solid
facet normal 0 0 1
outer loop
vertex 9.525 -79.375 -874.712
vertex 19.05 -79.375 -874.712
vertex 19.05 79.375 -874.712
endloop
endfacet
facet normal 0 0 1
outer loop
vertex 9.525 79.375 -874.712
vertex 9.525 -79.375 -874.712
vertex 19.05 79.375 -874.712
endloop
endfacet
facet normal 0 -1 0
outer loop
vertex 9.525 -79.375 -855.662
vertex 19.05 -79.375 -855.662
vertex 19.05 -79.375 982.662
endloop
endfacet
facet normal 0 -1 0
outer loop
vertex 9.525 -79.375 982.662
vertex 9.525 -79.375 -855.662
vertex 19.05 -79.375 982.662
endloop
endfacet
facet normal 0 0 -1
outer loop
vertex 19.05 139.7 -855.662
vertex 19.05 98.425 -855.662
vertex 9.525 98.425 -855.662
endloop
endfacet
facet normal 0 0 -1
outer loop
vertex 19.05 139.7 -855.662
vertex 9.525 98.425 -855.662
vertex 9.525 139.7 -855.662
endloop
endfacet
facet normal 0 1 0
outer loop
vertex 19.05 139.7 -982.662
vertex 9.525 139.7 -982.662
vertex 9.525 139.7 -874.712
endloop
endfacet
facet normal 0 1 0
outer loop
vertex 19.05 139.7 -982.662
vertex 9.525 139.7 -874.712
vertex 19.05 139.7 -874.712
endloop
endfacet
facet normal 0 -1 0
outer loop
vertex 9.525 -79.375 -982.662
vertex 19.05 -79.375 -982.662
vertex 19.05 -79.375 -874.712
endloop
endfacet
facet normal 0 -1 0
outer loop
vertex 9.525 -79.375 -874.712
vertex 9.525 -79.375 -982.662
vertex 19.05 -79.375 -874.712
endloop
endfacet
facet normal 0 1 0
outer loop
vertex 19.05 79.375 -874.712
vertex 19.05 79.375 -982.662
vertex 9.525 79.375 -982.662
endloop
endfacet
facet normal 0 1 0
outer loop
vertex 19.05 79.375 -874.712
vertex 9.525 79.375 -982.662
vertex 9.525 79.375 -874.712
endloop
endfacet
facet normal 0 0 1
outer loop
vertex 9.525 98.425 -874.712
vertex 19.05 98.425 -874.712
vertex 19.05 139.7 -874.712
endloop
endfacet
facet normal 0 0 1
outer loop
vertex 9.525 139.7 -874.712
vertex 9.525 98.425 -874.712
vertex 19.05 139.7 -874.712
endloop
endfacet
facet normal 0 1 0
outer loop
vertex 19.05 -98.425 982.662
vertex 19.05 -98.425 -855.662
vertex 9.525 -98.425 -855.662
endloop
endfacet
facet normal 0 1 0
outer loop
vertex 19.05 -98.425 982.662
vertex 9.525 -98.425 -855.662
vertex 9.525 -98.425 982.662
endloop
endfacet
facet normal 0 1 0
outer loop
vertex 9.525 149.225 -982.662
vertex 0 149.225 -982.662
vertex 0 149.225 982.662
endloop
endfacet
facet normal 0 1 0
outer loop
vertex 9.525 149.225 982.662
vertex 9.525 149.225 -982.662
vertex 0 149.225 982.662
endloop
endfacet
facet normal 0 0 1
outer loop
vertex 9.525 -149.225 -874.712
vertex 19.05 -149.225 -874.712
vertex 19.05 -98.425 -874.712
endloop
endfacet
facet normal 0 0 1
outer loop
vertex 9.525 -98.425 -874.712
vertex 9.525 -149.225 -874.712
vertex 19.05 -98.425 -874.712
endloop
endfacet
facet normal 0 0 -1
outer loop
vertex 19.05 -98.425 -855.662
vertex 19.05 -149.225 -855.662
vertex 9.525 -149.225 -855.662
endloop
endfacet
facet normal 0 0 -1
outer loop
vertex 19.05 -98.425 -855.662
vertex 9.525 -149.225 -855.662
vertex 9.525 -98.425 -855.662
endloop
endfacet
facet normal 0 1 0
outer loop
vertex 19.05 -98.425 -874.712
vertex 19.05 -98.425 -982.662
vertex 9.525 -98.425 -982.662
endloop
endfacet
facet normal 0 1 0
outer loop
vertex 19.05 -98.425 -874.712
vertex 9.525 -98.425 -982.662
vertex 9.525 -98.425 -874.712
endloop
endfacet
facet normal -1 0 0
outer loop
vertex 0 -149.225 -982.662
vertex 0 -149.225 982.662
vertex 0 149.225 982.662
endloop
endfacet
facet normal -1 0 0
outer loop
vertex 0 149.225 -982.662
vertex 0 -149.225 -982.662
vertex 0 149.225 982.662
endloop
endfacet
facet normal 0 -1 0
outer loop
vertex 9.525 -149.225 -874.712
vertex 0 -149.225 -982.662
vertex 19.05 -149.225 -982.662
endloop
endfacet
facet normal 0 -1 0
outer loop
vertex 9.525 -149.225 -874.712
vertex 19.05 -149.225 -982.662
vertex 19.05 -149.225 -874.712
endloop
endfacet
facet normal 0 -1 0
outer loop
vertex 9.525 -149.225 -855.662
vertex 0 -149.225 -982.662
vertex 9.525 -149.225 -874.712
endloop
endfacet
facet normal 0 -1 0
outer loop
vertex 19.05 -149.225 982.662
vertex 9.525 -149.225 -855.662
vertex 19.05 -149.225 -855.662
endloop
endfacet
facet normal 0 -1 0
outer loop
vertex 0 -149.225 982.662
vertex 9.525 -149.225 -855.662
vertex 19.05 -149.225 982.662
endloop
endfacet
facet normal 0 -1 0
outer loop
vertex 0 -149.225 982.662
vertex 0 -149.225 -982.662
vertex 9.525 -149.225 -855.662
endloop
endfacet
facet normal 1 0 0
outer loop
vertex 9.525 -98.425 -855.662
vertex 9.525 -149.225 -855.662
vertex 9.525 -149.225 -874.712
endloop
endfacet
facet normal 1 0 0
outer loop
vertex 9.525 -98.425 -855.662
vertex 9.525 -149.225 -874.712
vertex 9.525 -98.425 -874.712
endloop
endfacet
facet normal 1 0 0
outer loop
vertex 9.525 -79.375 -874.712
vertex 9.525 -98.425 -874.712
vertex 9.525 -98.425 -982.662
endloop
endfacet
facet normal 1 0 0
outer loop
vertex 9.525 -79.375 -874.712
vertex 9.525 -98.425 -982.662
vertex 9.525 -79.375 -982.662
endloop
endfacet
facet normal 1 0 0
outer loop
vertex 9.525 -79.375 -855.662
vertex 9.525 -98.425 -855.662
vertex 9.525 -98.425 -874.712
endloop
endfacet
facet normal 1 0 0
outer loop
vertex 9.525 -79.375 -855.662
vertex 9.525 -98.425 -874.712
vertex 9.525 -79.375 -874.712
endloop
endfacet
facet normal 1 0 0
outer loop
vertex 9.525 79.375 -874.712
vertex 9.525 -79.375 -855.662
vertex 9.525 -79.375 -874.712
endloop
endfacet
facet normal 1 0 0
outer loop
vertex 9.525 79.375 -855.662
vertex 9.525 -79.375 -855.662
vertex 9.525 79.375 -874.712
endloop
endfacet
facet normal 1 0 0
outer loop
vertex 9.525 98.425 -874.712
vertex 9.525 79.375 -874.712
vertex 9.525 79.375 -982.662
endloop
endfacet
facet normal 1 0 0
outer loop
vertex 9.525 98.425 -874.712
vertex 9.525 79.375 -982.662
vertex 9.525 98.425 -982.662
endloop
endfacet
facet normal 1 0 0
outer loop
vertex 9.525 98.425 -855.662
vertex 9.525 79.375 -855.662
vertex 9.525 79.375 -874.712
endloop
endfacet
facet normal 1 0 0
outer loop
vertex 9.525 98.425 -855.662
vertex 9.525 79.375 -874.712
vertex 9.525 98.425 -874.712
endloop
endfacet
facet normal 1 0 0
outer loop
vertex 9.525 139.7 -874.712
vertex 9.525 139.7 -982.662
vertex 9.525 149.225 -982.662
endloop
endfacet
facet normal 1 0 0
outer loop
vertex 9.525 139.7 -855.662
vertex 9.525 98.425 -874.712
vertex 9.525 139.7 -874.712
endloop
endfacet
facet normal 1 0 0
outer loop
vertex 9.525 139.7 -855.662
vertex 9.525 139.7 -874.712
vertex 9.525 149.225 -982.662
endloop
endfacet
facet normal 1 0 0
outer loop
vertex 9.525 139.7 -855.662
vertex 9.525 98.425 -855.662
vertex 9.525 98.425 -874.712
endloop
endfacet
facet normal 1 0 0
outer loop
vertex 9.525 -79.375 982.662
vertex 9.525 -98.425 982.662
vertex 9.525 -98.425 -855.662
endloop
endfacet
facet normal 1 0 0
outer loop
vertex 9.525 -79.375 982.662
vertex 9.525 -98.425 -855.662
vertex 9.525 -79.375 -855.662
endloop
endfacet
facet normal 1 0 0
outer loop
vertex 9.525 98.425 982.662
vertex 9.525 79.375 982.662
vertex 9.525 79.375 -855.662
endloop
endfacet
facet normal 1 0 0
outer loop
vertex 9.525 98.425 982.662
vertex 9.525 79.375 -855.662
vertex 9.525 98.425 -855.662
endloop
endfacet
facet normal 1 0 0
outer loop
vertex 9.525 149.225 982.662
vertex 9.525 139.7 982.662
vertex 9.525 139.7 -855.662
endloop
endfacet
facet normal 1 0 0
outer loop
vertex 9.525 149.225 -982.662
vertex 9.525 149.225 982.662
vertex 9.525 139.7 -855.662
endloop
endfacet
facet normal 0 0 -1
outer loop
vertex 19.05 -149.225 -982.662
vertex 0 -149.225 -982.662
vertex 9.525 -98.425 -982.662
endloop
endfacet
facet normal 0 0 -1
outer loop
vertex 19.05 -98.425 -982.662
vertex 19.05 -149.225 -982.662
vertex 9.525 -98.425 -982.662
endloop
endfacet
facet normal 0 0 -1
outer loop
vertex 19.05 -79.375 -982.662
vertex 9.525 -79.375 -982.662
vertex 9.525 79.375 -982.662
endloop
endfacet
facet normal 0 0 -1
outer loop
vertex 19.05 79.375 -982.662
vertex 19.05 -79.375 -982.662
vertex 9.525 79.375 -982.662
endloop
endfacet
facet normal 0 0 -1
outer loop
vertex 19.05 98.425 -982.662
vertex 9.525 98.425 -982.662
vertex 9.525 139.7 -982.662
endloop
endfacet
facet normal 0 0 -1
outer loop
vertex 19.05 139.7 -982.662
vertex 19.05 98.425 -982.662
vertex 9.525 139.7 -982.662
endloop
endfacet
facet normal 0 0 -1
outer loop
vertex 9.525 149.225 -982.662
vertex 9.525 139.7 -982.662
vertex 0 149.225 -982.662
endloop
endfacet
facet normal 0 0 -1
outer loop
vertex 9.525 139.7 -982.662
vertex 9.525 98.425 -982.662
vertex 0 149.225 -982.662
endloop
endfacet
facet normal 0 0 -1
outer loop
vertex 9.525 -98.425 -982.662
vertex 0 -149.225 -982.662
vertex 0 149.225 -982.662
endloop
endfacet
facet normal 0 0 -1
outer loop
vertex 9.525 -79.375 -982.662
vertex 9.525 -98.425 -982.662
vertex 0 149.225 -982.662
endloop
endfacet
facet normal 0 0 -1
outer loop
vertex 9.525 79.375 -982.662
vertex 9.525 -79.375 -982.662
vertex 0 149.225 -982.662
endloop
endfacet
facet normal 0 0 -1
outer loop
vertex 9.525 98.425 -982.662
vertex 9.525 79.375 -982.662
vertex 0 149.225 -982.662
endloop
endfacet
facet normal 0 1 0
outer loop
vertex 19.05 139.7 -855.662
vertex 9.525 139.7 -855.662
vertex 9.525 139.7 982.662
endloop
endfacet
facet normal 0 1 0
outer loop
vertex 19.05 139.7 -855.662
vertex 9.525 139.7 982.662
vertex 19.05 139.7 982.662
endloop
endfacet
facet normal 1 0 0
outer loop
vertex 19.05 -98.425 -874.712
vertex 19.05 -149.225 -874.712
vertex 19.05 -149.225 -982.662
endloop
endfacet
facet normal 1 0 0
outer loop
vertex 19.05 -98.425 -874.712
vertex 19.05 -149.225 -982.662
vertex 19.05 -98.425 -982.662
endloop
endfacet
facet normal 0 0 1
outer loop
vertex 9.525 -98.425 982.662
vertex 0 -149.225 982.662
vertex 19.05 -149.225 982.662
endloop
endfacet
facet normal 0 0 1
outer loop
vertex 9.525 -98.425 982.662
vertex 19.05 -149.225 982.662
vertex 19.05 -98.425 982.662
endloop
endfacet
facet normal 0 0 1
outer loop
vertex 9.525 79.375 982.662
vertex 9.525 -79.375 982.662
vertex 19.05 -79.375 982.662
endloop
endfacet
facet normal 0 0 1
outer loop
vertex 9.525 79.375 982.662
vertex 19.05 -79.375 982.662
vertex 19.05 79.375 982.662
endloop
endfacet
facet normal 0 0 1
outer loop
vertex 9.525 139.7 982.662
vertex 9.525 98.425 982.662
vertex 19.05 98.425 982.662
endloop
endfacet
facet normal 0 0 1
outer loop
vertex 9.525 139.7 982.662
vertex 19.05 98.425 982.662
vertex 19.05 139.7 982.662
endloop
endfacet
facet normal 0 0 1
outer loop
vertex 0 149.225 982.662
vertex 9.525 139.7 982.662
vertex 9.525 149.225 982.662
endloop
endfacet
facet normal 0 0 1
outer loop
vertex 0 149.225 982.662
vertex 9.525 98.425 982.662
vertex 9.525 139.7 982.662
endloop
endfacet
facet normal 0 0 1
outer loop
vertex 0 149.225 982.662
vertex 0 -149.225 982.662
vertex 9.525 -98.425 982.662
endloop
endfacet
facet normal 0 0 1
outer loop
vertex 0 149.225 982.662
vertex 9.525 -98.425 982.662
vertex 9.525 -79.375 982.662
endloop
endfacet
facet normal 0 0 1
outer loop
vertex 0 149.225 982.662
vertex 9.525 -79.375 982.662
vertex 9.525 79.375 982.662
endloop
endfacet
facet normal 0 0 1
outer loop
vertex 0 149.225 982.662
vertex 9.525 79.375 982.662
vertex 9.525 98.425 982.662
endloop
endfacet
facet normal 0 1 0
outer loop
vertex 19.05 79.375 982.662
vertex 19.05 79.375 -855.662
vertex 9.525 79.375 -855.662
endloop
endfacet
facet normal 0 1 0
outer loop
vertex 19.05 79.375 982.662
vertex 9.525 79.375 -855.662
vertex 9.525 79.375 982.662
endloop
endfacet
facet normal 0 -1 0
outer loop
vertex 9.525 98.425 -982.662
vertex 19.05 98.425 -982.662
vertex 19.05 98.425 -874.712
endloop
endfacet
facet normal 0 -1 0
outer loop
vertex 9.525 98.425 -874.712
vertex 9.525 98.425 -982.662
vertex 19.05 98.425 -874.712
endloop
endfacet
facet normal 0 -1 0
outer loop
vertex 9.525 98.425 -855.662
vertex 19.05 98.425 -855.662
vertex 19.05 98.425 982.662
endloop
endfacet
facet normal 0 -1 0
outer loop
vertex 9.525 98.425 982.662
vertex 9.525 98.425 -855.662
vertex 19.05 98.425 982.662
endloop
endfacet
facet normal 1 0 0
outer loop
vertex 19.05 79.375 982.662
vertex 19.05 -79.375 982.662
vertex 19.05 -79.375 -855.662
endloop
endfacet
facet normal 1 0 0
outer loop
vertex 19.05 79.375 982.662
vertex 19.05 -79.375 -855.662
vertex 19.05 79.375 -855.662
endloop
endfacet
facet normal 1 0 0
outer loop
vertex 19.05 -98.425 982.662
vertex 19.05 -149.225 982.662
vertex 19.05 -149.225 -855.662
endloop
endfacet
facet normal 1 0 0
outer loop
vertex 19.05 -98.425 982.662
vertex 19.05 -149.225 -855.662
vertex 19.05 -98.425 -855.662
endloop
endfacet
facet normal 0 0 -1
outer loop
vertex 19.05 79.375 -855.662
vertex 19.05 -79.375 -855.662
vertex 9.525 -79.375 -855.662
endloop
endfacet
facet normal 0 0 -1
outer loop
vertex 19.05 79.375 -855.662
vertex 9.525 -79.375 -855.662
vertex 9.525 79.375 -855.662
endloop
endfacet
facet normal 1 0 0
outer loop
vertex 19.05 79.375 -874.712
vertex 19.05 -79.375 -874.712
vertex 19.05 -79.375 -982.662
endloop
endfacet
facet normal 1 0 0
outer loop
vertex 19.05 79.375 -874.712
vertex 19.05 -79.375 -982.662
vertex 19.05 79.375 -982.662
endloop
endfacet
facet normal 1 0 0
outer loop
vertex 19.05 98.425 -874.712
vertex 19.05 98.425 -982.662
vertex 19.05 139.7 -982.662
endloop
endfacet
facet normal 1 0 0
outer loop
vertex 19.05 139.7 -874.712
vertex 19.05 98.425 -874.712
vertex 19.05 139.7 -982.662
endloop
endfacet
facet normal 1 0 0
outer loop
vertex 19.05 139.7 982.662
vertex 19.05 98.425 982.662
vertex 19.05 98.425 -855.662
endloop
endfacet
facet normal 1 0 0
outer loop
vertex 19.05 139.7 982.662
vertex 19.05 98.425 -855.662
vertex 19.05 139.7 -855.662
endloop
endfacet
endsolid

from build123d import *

# Parameters (mm, degrees)
F0_W     = 298.45
F0_H     = 1965.325
F1_DEPTH = 19.05
F2_W     = 298.45
F2_H     = 19.05
F3_DEPTH = 9.525
F4_W     = 19.05
F4_H     = 1965.325
F5_DEPTH = 9.525
F6_W     = 9.525
F6_H     = 9.525
F7_DEPTH = 1965.326


with BuildPart() as f1:
    # F0 (on Right) → F1 (new body)
    with BuildSketch(Plane.YZ):
        Rectangle(F0_W, F0_H)
    extrude(amount=F1_DEPTH)

    # F2 (on face) → F3 (cut)
    with BuildSketch(Plane.YZ.offset(19.05)):
        with Locations((0, -865.1875)):
            Rectangle(F2_W, F2_H)
    extrude(amount=-F3_DEPTH, mode=Mode.SUBTRACT)

    # F4 (on face) → F5 (cut)
    with BuildSketch(Plane.YZ.offset(19.05)):
        with Locations((-88.9, 0)):
            Rectangle(F4_W, F4_H)
        with Locations((88.9, 0)):
            Rectangle(F4_W, F4_H)
    extrude(amount=-F5_DEPTH, mode=Mode.SUBTRACT)

    # F6 (on face) → F7 (cut, through all)
    with BuildSketch(Plane(origin=(0, 0, -982.6625), x_dir=(1, 0, 0), z_dir=(0, 0, -1))):
        with Locations((14.2875, -144.4625)):
            Rectangle(F6_W, F6_H)
    extrude(amount=-F7_DEPTH, mode=Mode.SUBTRACT)


solid = f1.part
